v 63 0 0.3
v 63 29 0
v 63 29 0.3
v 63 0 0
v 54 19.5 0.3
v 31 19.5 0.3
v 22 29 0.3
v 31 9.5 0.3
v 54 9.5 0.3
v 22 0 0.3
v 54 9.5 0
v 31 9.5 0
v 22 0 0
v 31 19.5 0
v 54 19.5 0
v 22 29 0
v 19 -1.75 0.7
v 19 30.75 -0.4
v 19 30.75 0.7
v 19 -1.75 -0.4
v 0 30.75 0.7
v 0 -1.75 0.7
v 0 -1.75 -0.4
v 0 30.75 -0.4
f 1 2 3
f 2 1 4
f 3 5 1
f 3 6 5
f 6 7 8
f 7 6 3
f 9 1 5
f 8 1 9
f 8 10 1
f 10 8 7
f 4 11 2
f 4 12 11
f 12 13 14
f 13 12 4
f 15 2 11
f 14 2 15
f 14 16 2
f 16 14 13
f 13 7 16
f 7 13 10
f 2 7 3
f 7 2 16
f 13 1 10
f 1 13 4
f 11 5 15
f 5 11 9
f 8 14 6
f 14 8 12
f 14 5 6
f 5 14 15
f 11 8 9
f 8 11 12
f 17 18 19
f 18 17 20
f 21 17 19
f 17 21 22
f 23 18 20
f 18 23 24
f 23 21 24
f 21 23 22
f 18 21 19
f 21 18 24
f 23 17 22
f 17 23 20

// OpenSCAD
module receiver(){
    //CoilDimensions
    coilLength = 41;
    coilDepth = 29;
    coilHeight = 0.3;
    coilDimensions = [coilLength, coilDepth, coilHeight];
    //CoilHoleDimensions
    coilHoleLength = 23;
    coilHoleDepth = 10;
    coilHoleHeight = 2 * coilHeight;
    coilHoleDimensions = [coilHoleLength, coilHoleDepth, coilHoleHeight];
    //ChipDimensions
    chipLength = 19;
    chipDepth = 32.5;
    chipHeight = 1.1;
    chipDimensions = [chipLength, chipDepth, chipHeight];
    
    coil_chip_spacing = 3;
    module receiverCoil(coilDimensions, coilHoleDimensions){
        difference(){
            cube(coilDimensions);
            trans = [(coilDimensions.x - coilHoleDimensions.x) / 2,
            (coilDimensions.y - coilHoleDimensions.y) / 2,
            -(coilHoleDimensions.z - coilDimensions.z) / 2];
            translate(trans){
                color([1.0, 0.0, 0.0, 1.0]){
                    cube(coilHoleDimensions);
                }
            }
        }
    }
    center = [chipLength + coil_chip_spacing,
    0, 0];
    translate(center){
        receiverCoil(coilDimensions, coilHoleDimensions);
        trans = [-coil_chip_spacing - chipLength,
        -(chipDepth - coilDepth) / 2,
        -(chipHeight - coilHeight) / 2];
        translate(trans){
            cube(chipDimensions);
        }
    }
}

receiver();
